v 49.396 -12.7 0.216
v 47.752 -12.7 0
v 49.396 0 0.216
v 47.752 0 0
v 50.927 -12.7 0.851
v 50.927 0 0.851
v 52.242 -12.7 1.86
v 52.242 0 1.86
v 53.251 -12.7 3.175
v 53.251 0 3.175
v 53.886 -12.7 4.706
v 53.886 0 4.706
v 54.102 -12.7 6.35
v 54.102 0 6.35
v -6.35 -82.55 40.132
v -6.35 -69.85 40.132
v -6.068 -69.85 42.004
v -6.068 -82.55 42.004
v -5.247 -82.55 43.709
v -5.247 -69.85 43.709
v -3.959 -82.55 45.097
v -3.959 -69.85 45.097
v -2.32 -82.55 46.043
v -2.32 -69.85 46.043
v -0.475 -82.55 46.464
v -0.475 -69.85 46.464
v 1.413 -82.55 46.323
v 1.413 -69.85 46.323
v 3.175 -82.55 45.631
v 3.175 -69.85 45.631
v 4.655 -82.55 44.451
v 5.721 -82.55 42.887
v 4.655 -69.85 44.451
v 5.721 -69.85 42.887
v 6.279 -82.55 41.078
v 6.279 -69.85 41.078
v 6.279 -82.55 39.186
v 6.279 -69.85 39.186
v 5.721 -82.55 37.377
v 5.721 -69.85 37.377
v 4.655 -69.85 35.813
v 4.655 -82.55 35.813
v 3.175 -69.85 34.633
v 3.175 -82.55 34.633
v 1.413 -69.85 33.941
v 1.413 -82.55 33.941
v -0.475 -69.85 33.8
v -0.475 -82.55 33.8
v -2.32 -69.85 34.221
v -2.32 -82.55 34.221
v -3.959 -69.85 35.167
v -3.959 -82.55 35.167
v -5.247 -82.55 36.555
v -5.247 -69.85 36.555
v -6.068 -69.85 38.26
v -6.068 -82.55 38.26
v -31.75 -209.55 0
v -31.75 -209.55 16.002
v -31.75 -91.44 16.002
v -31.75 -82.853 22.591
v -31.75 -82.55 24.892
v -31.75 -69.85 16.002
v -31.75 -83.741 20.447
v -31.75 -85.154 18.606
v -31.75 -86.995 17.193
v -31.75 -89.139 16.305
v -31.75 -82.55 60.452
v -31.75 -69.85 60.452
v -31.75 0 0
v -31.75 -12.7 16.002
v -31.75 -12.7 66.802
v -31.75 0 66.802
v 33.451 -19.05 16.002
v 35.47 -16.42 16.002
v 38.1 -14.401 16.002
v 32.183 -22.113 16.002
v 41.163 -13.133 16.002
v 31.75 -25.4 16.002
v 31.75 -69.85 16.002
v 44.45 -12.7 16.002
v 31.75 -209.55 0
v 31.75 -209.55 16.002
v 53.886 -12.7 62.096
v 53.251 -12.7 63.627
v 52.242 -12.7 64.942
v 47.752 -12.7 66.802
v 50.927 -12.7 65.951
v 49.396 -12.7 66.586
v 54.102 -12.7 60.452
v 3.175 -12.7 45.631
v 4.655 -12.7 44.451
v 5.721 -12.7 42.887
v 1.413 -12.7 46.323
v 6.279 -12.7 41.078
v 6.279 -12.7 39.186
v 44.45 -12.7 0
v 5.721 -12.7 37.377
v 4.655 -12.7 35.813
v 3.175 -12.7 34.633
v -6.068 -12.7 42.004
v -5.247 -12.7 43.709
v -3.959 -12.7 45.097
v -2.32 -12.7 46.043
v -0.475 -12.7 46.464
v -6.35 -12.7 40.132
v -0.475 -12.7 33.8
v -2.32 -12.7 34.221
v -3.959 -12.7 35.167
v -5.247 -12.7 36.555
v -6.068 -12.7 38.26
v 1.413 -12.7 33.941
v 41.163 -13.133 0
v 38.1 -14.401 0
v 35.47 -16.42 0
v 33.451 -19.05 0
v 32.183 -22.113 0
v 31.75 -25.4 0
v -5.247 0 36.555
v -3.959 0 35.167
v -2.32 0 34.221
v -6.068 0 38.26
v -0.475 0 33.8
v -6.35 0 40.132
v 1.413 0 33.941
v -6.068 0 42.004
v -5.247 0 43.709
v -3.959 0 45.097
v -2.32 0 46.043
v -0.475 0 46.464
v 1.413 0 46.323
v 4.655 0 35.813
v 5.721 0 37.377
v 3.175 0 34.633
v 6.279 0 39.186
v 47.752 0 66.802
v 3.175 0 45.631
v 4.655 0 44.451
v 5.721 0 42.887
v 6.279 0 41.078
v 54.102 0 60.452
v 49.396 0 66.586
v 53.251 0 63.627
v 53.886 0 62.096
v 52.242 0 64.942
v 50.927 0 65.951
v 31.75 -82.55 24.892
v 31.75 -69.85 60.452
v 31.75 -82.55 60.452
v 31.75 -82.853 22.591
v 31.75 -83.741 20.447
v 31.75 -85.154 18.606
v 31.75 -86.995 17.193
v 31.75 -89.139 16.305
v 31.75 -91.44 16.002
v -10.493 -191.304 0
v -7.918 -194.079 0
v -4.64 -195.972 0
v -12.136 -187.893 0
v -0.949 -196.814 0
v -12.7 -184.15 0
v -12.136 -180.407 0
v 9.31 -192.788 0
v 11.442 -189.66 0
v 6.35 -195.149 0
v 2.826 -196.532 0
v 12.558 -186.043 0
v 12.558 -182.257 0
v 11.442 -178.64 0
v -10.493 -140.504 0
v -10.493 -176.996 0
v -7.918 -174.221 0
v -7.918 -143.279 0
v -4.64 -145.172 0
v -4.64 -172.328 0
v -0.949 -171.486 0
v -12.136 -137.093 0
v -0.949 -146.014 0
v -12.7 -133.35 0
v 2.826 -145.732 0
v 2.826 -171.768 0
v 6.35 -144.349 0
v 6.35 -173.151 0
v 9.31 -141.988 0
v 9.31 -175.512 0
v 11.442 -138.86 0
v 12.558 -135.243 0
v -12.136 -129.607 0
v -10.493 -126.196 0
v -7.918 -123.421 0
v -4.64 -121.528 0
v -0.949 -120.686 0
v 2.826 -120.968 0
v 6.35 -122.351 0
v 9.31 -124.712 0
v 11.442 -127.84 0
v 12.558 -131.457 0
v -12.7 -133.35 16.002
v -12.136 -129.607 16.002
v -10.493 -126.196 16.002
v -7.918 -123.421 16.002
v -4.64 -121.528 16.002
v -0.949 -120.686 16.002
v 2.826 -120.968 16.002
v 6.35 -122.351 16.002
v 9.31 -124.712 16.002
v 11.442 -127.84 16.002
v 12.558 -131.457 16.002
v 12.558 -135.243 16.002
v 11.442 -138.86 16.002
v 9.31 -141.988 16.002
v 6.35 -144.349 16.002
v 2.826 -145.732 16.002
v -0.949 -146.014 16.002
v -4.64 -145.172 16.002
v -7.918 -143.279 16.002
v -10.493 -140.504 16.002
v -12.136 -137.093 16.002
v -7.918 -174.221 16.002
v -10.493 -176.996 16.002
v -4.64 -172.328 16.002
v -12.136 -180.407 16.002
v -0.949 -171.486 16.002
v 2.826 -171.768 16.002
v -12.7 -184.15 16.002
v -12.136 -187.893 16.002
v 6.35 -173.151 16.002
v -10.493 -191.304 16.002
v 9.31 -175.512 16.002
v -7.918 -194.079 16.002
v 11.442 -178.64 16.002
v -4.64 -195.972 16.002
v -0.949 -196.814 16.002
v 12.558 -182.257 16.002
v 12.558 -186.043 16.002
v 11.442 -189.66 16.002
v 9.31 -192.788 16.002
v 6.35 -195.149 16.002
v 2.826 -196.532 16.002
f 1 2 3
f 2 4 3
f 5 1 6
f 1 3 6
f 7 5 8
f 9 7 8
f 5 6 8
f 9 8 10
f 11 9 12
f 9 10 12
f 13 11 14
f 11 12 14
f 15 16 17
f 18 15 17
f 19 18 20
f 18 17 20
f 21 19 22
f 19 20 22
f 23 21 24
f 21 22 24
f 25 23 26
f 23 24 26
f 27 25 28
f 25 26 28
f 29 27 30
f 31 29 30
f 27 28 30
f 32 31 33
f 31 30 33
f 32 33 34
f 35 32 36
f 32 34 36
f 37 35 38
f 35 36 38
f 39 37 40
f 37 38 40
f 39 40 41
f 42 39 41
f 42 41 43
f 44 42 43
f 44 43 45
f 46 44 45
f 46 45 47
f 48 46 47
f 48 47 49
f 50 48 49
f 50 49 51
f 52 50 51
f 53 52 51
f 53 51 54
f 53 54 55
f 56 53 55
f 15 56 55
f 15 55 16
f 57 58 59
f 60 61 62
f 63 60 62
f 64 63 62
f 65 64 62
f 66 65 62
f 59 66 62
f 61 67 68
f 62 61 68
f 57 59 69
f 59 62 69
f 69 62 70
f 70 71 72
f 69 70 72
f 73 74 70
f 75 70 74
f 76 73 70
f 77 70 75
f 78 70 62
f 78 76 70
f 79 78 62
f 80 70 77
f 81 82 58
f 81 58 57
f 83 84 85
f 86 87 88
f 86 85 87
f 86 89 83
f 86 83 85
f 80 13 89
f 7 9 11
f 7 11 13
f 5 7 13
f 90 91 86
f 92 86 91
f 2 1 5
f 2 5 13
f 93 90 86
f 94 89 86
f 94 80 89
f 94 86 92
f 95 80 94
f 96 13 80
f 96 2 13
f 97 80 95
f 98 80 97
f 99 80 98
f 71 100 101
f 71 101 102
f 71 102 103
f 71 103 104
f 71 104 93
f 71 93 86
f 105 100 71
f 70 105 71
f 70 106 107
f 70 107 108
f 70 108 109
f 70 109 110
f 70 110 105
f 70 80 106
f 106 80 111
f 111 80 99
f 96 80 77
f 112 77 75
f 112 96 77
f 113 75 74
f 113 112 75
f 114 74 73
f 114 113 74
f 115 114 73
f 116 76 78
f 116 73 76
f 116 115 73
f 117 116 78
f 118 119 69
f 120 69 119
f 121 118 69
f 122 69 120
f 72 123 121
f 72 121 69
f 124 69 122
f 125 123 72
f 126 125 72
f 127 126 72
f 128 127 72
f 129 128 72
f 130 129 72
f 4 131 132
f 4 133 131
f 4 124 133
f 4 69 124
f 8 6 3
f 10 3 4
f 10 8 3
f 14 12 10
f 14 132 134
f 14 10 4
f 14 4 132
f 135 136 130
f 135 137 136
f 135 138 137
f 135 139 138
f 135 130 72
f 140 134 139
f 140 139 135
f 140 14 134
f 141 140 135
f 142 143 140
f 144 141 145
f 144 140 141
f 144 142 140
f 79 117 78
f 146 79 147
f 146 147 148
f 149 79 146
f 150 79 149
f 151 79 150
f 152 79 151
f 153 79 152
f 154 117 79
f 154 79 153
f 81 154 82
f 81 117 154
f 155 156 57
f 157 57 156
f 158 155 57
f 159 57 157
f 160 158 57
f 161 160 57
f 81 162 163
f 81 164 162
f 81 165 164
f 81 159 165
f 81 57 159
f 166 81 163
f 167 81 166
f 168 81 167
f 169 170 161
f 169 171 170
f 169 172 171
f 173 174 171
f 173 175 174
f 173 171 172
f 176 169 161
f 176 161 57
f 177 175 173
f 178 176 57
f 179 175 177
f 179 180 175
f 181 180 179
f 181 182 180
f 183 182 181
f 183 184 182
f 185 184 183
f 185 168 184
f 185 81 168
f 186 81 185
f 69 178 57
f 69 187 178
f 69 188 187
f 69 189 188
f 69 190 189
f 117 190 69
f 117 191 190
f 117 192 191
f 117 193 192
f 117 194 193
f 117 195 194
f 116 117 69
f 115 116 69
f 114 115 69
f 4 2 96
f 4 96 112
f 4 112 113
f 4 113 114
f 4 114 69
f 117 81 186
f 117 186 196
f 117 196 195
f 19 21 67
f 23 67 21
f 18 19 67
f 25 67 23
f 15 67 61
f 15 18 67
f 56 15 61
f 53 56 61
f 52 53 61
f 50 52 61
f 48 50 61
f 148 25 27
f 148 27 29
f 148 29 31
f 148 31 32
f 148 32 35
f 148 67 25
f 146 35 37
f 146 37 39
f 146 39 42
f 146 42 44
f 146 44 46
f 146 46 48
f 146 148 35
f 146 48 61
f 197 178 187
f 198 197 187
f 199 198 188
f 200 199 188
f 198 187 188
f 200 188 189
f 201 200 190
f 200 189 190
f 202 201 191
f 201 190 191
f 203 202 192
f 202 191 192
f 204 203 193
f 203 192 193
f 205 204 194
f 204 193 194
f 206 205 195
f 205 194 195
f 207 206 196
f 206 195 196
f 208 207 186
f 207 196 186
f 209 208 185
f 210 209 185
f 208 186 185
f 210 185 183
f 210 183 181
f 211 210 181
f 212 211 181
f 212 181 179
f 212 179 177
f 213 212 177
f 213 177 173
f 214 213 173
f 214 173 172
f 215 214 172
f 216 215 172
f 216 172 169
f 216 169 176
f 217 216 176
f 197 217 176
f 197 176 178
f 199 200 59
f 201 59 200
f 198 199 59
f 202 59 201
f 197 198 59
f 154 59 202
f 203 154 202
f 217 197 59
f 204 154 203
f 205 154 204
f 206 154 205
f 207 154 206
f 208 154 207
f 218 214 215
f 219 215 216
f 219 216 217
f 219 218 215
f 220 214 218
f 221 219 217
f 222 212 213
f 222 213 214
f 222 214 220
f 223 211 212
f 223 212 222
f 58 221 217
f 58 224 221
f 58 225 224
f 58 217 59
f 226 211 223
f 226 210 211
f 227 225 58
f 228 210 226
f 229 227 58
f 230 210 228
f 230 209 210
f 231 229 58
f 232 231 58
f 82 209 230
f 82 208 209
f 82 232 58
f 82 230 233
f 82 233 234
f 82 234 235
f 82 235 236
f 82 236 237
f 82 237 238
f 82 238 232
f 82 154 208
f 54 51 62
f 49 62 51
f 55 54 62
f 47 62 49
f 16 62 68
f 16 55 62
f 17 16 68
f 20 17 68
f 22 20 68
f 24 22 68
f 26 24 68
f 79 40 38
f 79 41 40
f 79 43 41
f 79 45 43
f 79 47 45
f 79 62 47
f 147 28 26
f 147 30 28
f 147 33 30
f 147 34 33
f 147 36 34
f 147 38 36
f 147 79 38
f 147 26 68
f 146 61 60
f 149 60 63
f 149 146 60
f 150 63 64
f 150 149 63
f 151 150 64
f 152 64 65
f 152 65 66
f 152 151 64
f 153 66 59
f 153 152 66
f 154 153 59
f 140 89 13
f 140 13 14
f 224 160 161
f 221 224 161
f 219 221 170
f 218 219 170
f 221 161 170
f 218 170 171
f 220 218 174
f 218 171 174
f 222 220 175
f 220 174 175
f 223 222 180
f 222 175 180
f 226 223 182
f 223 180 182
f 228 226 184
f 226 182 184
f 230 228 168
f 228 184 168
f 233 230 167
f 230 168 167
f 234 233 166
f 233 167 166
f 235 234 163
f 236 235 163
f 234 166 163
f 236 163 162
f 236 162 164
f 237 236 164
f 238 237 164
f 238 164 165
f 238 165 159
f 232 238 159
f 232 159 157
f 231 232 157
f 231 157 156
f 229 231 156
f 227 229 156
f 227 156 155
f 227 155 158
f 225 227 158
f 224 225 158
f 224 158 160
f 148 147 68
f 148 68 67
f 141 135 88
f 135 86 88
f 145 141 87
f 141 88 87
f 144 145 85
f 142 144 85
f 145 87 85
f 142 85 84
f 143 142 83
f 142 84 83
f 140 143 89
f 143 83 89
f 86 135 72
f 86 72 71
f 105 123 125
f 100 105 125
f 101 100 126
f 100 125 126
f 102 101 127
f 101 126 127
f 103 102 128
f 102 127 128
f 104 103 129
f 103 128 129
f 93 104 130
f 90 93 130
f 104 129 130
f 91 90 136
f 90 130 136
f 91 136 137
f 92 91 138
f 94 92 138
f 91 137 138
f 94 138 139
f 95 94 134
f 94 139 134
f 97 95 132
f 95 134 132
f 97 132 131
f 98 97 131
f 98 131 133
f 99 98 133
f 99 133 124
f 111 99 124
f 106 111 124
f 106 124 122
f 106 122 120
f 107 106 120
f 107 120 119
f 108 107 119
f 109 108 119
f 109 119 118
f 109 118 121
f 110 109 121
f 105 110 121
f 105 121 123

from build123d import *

# Parameters (mm, degrees)
F1_DEPTH      = 54.102
F1_DEPTH_BACK = 31.75
F3_DEPTH      = 66.802
F4_R          = 6.35
F6_D          = 25.4
F8_D          = 12.7


with BuildPart() as f1:
    # F0 (on Right) → F1 (new body, two sides)
    with BuildSketch(Plane.YZ) as f1_sk:
        with BuildLine():
            Line((-209.55, 0), (0, 0))
            Line((0, 0), (0, 66.802))
            Line((0, 66.802), (-12.7, 66.802))
            Line((-12.7, 66.802), (-12.7, 16.002))
            Line((-12.7, 16.002), (-69.85, 16.002))
            Line((-69.85, 16.002), (-69.85, 60.452))
            Line((-69.85, 60.452), (-82.55, 60.452))
            Line((-82.55, 60.452), (-82.55, 24.892))
            ThreePointArc((-82.55, 24.892), (-85.153821, 18.605821), (-91.44, 16.002))
            Line((-91.44, 16.002), (-209.55, 16.002))
            Line((-209.55, 16.002), (-209.55, 0))
        make_face()
    extrude(amount=F1_DEPTH)
    extrude(f1_sk.sketch, amount=-F1_DEPTH_BACK)

    # F2 (on Top) → F3 (cut)
    with BuildSketch(Plane.XY):
        with BuildLine():
            Line((31.75, -209.55), (54.102, -209.55))
            Line((54.102, -209.55), (54.102, -12.7))
            Line((54.102, -12.7), (44.45, -12.7))
            ThreePointArc((44.45, -12.7), (35.469744, -16.419744), (31.75, -25.4))
            Line((31.75, -25.4), (31.75, -209.55))
        make_face()
    extrude(amount=F3_DEPTH, mode=Mode.SUBTRACT)

    # F4
    f4_edges = [f1.edges().sort_by_distance(p)[0] for p in [
        (54.102, -6.35, 0),
        (54.102, -6.35, 66.802),
    ]]
    fillet(f4_edges, radius=F4_R)

    # F6 (through all)
    with Locations(Plane.XY.offset(16.002)):
        with Locations((0, -133.35), (0, -184.15)):
            Hole(F6_D / 2)

    # F8 (through all)
    with Locations(Plane.XZ.offset(82.55)):
        with Locations((0, 40.132)):
            Hole(F8_D / 2)


solid = f1.part
